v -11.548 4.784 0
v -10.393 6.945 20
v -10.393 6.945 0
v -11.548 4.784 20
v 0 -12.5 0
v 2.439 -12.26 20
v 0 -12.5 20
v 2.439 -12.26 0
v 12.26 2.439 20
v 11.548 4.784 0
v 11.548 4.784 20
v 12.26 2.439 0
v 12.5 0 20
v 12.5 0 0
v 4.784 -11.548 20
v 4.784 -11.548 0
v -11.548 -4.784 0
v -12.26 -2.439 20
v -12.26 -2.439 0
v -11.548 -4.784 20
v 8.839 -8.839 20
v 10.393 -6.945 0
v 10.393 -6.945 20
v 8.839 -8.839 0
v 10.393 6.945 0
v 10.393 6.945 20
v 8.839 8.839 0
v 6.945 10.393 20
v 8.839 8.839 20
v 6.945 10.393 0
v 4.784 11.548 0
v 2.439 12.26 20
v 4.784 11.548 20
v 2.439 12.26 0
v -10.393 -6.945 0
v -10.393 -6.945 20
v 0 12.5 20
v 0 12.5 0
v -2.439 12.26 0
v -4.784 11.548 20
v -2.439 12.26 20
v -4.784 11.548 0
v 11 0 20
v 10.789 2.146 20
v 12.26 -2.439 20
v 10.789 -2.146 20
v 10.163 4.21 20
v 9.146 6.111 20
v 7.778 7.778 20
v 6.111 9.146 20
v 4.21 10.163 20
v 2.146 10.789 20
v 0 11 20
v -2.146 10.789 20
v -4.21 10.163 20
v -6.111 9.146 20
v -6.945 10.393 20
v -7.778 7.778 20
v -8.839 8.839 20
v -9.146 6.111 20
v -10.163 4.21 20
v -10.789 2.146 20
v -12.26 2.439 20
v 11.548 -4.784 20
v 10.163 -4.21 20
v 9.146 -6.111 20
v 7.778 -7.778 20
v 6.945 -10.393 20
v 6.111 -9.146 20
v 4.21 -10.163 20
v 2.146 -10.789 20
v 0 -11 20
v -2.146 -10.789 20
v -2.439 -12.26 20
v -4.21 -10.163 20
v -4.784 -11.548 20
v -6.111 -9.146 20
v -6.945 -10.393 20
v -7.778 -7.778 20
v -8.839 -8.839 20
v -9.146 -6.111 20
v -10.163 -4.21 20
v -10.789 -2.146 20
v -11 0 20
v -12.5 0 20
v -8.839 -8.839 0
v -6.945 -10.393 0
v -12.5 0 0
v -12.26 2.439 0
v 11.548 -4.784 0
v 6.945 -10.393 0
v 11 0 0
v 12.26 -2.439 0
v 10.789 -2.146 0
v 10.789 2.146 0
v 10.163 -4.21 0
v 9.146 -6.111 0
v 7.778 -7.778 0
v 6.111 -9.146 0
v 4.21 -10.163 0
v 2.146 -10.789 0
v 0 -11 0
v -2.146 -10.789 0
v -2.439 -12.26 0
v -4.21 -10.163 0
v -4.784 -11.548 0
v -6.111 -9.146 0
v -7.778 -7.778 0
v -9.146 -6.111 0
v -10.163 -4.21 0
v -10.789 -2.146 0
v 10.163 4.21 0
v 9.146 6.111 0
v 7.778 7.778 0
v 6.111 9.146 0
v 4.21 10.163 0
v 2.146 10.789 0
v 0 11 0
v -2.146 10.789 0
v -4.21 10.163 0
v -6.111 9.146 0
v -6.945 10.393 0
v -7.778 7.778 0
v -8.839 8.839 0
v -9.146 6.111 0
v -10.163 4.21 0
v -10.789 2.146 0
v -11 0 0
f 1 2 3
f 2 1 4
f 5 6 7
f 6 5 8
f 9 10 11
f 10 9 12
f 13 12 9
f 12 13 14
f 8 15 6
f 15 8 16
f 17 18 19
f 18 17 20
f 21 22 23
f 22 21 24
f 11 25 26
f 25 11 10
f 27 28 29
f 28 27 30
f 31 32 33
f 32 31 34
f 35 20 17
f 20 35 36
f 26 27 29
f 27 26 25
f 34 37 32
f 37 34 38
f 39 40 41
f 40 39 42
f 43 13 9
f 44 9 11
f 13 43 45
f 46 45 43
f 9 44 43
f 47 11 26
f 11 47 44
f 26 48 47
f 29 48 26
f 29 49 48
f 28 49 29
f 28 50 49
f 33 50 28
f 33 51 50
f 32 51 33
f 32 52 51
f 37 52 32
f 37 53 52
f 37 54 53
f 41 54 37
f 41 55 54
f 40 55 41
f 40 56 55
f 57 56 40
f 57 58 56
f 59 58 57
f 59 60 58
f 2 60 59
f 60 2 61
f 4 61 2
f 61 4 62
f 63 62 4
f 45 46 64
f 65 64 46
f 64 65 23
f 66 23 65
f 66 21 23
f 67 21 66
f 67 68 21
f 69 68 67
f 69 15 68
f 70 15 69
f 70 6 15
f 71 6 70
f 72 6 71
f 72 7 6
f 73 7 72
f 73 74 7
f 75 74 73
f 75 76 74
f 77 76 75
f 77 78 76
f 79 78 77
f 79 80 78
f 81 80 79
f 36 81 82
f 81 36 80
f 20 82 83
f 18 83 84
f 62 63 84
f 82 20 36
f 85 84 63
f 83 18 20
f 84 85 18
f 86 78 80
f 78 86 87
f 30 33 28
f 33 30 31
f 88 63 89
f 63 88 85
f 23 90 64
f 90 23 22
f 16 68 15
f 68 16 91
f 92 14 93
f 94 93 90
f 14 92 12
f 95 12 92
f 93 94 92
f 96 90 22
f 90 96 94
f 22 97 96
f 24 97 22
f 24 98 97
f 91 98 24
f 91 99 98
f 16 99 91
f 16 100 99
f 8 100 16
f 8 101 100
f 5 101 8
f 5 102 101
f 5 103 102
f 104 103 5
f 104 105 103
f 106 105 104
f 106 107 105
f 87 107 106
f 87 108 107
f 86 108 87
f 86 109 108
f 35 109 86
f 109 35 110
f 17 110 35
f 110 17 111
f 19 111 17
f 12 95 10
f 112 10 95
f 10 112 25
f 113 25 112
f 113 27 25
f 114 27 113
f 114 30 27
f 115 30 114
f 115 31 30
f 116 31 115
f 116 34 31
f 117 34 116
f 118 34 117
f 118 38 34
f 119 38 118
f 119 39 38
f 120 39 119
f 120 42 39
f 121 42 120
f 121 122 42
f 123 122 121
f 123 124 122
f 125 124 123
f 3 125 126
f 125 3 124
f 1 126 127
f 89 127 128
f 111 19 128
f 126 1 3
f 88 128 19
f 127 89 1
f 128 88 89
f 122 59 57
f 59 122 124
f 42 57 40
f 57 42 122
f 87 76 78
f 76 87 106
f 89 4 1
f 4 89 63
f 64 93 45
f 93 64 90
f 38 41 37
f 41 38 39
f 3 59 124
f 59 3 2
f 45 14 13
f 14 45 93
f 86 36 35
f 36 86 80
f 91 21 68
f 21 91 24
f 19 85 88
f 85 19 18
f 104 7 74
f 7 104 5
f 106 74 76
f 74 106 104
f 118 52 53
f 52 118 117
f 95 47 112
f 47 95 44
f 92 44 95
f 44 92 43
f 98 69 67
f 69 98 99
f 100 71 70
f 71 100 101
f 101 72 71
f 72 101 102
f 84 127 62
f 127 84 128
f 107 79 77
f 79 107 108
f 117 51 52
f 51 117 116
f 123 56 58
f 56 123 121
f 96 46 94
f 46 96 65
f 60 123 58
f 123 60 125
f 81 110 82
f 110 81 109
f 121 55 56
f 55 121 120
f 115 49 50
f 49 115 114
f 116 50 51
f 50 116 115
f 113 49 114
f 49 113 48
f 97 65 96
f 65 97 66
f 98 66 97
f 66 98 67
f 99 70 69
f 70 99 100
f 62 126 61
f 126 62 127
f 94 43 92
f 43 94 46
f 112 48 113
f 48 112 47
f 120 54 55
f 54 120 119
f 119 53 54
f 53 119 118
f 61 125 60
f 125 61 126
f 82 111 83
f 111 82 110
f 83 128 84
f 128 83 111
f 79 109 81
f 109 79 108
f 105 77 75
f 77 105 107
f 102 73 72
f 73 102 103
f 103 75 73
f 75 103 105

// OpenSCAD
$fn = 32;

// ----------------------------------------------------------------------
// Thin tube: 1.5 mm wall
// ----------------------------------------------------------------------

// --- parameters (mm) ---
tube_od = 25;             // outer diameter
tube_h = 20;              // height, Z
wall = 1.5;               // wall thickness

difference() {
  cylinder(h = tube_h, d = tube_od);
  translate([0, 0, -1]) cylinder(h = tube_h + 2, d = tube_od - 2 * wall);
}
